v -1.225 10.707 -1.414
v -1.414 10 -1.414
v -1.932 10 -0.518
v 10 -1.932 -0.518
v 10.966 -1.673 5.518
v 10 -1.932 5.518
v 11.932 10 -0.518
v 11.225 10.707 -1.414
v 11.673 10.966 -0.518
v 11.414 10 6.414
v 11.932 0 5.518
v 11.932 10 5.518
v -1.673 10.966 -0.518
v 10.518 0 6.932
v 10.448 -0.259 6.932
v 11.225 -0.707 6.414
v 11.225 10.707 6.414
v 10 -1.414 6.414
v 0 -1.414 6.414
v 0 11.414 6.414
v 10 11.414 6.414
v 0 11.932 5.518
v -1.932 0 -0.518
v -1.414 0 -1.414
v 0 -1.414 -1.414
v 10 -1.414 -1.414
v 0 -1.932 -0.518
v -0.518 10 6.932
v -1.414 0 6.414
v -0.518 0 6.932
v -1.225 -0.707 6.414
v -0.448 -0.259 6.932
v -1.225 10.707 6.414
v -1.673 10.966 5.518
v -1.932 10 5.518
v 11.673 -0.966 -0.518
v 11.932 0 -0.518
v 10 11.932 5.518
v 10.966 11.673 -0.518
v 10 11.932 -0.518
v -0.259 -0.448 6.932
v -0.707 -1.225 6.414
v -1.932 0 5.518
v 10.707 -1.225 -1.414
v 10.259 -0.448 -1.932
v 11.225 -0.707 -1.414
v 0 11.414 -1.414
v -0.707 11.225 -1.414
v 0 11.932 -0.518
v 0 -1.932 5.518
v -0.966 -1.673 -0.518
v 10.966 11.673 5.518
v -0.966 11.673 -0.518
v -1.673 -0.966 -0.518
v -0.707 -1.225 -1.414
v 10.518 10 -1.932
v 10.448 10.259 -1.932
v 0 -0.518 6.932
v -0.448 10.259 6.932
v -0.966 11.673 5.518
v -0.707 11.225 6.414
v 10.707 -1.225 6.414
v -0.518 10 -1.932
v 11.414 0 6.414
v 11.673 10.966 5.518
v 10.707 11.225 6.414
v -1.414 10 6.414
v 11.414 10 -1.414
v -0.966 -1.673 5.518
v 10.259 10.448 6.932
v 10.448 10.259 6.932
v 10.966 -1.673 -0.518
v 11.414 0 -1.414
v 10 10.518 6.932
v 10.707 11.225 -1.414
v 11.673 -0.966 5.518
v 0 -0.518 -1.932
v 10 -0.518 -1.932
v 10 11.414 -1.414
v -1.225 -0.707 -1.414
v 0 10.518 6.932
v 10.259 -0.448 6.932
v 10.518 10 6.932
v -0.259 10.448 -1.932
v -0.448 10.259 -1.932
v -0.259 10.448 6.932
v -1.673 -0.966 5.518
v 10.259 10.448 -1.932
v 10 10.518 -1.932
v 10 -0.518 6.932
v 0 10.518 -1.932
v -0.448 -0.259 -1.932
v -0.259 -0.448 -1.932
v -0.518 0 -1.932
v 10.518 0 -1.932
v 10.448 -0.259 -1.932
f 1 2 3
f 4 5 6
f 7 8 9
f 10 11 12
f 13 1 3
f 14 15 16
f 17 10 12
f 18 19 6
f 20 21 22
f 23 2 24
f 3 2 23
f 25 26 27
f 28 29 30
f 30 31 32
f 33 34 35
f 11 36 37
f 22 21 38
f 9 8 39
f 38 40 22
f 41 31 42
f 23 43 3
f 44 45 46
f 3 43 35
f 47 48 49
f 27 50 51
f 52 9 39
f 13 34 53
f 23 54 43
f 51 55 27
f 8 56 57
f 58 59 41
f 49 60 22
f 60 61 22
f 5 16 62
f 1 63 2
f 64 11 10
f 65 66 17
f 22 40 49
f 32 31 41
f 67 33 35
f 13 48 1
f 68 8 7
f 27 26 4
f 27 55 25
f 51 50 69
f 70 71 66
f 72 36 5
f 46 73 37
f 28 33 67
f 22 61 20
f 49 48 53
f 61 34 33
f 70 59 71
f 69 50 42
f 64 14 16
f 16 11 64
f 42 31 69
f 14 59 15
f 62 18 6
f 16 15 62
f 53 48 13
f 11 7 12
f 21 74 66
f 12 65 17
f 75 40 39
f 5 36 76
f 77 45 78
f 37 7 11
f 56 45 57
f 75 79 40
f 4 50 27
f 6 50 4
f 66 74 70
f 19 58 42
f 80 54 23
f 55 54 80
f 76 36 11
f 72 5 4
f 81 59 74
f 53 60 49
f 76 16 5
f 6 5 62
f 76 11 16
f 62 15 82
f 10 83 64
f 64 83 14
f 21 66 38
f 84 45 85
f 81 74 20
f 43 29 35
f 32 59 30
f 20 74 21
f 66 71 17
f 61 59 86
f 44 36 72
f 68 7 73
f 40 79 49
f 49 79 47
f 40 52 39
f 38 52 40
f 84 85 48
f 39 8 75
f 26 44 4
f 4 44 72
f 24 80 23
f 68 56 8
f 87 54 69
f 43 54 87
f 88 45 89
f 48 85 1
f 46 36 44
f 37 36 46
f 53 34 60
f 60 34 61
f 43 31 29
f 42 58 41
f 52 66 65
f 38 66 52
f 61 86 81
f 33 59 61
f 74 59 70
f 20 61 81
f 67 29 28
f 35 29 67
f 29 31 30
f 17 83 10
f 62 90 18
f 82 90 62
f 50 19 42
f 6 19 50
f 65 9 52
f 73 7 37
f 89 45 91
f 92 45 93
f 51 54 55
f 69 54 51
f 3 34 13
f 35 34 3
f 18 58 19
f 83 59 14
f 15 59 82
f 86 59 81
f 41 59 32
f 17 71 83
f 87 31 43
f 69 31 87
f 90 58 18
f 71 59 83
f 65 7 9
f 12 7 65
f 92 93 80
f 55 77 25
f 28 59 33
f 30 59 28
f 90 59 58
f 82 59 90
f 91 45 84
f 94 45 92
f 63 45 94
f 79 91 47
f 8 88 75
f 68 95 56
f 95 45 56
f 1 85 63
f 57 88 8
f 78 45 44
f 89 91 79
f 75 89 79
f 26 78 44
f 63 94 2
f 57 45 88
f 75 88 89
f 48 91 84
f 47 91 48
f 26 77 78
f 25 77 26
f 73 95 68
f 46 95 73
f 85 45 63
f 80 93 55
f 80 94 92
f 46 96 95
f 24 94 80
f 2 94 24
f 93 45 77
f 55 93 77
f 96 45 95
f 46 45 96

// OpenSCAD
minkowski() {
  cube([10, 10, 5]);
  sphere(r = 2, $fn = 12);
}
